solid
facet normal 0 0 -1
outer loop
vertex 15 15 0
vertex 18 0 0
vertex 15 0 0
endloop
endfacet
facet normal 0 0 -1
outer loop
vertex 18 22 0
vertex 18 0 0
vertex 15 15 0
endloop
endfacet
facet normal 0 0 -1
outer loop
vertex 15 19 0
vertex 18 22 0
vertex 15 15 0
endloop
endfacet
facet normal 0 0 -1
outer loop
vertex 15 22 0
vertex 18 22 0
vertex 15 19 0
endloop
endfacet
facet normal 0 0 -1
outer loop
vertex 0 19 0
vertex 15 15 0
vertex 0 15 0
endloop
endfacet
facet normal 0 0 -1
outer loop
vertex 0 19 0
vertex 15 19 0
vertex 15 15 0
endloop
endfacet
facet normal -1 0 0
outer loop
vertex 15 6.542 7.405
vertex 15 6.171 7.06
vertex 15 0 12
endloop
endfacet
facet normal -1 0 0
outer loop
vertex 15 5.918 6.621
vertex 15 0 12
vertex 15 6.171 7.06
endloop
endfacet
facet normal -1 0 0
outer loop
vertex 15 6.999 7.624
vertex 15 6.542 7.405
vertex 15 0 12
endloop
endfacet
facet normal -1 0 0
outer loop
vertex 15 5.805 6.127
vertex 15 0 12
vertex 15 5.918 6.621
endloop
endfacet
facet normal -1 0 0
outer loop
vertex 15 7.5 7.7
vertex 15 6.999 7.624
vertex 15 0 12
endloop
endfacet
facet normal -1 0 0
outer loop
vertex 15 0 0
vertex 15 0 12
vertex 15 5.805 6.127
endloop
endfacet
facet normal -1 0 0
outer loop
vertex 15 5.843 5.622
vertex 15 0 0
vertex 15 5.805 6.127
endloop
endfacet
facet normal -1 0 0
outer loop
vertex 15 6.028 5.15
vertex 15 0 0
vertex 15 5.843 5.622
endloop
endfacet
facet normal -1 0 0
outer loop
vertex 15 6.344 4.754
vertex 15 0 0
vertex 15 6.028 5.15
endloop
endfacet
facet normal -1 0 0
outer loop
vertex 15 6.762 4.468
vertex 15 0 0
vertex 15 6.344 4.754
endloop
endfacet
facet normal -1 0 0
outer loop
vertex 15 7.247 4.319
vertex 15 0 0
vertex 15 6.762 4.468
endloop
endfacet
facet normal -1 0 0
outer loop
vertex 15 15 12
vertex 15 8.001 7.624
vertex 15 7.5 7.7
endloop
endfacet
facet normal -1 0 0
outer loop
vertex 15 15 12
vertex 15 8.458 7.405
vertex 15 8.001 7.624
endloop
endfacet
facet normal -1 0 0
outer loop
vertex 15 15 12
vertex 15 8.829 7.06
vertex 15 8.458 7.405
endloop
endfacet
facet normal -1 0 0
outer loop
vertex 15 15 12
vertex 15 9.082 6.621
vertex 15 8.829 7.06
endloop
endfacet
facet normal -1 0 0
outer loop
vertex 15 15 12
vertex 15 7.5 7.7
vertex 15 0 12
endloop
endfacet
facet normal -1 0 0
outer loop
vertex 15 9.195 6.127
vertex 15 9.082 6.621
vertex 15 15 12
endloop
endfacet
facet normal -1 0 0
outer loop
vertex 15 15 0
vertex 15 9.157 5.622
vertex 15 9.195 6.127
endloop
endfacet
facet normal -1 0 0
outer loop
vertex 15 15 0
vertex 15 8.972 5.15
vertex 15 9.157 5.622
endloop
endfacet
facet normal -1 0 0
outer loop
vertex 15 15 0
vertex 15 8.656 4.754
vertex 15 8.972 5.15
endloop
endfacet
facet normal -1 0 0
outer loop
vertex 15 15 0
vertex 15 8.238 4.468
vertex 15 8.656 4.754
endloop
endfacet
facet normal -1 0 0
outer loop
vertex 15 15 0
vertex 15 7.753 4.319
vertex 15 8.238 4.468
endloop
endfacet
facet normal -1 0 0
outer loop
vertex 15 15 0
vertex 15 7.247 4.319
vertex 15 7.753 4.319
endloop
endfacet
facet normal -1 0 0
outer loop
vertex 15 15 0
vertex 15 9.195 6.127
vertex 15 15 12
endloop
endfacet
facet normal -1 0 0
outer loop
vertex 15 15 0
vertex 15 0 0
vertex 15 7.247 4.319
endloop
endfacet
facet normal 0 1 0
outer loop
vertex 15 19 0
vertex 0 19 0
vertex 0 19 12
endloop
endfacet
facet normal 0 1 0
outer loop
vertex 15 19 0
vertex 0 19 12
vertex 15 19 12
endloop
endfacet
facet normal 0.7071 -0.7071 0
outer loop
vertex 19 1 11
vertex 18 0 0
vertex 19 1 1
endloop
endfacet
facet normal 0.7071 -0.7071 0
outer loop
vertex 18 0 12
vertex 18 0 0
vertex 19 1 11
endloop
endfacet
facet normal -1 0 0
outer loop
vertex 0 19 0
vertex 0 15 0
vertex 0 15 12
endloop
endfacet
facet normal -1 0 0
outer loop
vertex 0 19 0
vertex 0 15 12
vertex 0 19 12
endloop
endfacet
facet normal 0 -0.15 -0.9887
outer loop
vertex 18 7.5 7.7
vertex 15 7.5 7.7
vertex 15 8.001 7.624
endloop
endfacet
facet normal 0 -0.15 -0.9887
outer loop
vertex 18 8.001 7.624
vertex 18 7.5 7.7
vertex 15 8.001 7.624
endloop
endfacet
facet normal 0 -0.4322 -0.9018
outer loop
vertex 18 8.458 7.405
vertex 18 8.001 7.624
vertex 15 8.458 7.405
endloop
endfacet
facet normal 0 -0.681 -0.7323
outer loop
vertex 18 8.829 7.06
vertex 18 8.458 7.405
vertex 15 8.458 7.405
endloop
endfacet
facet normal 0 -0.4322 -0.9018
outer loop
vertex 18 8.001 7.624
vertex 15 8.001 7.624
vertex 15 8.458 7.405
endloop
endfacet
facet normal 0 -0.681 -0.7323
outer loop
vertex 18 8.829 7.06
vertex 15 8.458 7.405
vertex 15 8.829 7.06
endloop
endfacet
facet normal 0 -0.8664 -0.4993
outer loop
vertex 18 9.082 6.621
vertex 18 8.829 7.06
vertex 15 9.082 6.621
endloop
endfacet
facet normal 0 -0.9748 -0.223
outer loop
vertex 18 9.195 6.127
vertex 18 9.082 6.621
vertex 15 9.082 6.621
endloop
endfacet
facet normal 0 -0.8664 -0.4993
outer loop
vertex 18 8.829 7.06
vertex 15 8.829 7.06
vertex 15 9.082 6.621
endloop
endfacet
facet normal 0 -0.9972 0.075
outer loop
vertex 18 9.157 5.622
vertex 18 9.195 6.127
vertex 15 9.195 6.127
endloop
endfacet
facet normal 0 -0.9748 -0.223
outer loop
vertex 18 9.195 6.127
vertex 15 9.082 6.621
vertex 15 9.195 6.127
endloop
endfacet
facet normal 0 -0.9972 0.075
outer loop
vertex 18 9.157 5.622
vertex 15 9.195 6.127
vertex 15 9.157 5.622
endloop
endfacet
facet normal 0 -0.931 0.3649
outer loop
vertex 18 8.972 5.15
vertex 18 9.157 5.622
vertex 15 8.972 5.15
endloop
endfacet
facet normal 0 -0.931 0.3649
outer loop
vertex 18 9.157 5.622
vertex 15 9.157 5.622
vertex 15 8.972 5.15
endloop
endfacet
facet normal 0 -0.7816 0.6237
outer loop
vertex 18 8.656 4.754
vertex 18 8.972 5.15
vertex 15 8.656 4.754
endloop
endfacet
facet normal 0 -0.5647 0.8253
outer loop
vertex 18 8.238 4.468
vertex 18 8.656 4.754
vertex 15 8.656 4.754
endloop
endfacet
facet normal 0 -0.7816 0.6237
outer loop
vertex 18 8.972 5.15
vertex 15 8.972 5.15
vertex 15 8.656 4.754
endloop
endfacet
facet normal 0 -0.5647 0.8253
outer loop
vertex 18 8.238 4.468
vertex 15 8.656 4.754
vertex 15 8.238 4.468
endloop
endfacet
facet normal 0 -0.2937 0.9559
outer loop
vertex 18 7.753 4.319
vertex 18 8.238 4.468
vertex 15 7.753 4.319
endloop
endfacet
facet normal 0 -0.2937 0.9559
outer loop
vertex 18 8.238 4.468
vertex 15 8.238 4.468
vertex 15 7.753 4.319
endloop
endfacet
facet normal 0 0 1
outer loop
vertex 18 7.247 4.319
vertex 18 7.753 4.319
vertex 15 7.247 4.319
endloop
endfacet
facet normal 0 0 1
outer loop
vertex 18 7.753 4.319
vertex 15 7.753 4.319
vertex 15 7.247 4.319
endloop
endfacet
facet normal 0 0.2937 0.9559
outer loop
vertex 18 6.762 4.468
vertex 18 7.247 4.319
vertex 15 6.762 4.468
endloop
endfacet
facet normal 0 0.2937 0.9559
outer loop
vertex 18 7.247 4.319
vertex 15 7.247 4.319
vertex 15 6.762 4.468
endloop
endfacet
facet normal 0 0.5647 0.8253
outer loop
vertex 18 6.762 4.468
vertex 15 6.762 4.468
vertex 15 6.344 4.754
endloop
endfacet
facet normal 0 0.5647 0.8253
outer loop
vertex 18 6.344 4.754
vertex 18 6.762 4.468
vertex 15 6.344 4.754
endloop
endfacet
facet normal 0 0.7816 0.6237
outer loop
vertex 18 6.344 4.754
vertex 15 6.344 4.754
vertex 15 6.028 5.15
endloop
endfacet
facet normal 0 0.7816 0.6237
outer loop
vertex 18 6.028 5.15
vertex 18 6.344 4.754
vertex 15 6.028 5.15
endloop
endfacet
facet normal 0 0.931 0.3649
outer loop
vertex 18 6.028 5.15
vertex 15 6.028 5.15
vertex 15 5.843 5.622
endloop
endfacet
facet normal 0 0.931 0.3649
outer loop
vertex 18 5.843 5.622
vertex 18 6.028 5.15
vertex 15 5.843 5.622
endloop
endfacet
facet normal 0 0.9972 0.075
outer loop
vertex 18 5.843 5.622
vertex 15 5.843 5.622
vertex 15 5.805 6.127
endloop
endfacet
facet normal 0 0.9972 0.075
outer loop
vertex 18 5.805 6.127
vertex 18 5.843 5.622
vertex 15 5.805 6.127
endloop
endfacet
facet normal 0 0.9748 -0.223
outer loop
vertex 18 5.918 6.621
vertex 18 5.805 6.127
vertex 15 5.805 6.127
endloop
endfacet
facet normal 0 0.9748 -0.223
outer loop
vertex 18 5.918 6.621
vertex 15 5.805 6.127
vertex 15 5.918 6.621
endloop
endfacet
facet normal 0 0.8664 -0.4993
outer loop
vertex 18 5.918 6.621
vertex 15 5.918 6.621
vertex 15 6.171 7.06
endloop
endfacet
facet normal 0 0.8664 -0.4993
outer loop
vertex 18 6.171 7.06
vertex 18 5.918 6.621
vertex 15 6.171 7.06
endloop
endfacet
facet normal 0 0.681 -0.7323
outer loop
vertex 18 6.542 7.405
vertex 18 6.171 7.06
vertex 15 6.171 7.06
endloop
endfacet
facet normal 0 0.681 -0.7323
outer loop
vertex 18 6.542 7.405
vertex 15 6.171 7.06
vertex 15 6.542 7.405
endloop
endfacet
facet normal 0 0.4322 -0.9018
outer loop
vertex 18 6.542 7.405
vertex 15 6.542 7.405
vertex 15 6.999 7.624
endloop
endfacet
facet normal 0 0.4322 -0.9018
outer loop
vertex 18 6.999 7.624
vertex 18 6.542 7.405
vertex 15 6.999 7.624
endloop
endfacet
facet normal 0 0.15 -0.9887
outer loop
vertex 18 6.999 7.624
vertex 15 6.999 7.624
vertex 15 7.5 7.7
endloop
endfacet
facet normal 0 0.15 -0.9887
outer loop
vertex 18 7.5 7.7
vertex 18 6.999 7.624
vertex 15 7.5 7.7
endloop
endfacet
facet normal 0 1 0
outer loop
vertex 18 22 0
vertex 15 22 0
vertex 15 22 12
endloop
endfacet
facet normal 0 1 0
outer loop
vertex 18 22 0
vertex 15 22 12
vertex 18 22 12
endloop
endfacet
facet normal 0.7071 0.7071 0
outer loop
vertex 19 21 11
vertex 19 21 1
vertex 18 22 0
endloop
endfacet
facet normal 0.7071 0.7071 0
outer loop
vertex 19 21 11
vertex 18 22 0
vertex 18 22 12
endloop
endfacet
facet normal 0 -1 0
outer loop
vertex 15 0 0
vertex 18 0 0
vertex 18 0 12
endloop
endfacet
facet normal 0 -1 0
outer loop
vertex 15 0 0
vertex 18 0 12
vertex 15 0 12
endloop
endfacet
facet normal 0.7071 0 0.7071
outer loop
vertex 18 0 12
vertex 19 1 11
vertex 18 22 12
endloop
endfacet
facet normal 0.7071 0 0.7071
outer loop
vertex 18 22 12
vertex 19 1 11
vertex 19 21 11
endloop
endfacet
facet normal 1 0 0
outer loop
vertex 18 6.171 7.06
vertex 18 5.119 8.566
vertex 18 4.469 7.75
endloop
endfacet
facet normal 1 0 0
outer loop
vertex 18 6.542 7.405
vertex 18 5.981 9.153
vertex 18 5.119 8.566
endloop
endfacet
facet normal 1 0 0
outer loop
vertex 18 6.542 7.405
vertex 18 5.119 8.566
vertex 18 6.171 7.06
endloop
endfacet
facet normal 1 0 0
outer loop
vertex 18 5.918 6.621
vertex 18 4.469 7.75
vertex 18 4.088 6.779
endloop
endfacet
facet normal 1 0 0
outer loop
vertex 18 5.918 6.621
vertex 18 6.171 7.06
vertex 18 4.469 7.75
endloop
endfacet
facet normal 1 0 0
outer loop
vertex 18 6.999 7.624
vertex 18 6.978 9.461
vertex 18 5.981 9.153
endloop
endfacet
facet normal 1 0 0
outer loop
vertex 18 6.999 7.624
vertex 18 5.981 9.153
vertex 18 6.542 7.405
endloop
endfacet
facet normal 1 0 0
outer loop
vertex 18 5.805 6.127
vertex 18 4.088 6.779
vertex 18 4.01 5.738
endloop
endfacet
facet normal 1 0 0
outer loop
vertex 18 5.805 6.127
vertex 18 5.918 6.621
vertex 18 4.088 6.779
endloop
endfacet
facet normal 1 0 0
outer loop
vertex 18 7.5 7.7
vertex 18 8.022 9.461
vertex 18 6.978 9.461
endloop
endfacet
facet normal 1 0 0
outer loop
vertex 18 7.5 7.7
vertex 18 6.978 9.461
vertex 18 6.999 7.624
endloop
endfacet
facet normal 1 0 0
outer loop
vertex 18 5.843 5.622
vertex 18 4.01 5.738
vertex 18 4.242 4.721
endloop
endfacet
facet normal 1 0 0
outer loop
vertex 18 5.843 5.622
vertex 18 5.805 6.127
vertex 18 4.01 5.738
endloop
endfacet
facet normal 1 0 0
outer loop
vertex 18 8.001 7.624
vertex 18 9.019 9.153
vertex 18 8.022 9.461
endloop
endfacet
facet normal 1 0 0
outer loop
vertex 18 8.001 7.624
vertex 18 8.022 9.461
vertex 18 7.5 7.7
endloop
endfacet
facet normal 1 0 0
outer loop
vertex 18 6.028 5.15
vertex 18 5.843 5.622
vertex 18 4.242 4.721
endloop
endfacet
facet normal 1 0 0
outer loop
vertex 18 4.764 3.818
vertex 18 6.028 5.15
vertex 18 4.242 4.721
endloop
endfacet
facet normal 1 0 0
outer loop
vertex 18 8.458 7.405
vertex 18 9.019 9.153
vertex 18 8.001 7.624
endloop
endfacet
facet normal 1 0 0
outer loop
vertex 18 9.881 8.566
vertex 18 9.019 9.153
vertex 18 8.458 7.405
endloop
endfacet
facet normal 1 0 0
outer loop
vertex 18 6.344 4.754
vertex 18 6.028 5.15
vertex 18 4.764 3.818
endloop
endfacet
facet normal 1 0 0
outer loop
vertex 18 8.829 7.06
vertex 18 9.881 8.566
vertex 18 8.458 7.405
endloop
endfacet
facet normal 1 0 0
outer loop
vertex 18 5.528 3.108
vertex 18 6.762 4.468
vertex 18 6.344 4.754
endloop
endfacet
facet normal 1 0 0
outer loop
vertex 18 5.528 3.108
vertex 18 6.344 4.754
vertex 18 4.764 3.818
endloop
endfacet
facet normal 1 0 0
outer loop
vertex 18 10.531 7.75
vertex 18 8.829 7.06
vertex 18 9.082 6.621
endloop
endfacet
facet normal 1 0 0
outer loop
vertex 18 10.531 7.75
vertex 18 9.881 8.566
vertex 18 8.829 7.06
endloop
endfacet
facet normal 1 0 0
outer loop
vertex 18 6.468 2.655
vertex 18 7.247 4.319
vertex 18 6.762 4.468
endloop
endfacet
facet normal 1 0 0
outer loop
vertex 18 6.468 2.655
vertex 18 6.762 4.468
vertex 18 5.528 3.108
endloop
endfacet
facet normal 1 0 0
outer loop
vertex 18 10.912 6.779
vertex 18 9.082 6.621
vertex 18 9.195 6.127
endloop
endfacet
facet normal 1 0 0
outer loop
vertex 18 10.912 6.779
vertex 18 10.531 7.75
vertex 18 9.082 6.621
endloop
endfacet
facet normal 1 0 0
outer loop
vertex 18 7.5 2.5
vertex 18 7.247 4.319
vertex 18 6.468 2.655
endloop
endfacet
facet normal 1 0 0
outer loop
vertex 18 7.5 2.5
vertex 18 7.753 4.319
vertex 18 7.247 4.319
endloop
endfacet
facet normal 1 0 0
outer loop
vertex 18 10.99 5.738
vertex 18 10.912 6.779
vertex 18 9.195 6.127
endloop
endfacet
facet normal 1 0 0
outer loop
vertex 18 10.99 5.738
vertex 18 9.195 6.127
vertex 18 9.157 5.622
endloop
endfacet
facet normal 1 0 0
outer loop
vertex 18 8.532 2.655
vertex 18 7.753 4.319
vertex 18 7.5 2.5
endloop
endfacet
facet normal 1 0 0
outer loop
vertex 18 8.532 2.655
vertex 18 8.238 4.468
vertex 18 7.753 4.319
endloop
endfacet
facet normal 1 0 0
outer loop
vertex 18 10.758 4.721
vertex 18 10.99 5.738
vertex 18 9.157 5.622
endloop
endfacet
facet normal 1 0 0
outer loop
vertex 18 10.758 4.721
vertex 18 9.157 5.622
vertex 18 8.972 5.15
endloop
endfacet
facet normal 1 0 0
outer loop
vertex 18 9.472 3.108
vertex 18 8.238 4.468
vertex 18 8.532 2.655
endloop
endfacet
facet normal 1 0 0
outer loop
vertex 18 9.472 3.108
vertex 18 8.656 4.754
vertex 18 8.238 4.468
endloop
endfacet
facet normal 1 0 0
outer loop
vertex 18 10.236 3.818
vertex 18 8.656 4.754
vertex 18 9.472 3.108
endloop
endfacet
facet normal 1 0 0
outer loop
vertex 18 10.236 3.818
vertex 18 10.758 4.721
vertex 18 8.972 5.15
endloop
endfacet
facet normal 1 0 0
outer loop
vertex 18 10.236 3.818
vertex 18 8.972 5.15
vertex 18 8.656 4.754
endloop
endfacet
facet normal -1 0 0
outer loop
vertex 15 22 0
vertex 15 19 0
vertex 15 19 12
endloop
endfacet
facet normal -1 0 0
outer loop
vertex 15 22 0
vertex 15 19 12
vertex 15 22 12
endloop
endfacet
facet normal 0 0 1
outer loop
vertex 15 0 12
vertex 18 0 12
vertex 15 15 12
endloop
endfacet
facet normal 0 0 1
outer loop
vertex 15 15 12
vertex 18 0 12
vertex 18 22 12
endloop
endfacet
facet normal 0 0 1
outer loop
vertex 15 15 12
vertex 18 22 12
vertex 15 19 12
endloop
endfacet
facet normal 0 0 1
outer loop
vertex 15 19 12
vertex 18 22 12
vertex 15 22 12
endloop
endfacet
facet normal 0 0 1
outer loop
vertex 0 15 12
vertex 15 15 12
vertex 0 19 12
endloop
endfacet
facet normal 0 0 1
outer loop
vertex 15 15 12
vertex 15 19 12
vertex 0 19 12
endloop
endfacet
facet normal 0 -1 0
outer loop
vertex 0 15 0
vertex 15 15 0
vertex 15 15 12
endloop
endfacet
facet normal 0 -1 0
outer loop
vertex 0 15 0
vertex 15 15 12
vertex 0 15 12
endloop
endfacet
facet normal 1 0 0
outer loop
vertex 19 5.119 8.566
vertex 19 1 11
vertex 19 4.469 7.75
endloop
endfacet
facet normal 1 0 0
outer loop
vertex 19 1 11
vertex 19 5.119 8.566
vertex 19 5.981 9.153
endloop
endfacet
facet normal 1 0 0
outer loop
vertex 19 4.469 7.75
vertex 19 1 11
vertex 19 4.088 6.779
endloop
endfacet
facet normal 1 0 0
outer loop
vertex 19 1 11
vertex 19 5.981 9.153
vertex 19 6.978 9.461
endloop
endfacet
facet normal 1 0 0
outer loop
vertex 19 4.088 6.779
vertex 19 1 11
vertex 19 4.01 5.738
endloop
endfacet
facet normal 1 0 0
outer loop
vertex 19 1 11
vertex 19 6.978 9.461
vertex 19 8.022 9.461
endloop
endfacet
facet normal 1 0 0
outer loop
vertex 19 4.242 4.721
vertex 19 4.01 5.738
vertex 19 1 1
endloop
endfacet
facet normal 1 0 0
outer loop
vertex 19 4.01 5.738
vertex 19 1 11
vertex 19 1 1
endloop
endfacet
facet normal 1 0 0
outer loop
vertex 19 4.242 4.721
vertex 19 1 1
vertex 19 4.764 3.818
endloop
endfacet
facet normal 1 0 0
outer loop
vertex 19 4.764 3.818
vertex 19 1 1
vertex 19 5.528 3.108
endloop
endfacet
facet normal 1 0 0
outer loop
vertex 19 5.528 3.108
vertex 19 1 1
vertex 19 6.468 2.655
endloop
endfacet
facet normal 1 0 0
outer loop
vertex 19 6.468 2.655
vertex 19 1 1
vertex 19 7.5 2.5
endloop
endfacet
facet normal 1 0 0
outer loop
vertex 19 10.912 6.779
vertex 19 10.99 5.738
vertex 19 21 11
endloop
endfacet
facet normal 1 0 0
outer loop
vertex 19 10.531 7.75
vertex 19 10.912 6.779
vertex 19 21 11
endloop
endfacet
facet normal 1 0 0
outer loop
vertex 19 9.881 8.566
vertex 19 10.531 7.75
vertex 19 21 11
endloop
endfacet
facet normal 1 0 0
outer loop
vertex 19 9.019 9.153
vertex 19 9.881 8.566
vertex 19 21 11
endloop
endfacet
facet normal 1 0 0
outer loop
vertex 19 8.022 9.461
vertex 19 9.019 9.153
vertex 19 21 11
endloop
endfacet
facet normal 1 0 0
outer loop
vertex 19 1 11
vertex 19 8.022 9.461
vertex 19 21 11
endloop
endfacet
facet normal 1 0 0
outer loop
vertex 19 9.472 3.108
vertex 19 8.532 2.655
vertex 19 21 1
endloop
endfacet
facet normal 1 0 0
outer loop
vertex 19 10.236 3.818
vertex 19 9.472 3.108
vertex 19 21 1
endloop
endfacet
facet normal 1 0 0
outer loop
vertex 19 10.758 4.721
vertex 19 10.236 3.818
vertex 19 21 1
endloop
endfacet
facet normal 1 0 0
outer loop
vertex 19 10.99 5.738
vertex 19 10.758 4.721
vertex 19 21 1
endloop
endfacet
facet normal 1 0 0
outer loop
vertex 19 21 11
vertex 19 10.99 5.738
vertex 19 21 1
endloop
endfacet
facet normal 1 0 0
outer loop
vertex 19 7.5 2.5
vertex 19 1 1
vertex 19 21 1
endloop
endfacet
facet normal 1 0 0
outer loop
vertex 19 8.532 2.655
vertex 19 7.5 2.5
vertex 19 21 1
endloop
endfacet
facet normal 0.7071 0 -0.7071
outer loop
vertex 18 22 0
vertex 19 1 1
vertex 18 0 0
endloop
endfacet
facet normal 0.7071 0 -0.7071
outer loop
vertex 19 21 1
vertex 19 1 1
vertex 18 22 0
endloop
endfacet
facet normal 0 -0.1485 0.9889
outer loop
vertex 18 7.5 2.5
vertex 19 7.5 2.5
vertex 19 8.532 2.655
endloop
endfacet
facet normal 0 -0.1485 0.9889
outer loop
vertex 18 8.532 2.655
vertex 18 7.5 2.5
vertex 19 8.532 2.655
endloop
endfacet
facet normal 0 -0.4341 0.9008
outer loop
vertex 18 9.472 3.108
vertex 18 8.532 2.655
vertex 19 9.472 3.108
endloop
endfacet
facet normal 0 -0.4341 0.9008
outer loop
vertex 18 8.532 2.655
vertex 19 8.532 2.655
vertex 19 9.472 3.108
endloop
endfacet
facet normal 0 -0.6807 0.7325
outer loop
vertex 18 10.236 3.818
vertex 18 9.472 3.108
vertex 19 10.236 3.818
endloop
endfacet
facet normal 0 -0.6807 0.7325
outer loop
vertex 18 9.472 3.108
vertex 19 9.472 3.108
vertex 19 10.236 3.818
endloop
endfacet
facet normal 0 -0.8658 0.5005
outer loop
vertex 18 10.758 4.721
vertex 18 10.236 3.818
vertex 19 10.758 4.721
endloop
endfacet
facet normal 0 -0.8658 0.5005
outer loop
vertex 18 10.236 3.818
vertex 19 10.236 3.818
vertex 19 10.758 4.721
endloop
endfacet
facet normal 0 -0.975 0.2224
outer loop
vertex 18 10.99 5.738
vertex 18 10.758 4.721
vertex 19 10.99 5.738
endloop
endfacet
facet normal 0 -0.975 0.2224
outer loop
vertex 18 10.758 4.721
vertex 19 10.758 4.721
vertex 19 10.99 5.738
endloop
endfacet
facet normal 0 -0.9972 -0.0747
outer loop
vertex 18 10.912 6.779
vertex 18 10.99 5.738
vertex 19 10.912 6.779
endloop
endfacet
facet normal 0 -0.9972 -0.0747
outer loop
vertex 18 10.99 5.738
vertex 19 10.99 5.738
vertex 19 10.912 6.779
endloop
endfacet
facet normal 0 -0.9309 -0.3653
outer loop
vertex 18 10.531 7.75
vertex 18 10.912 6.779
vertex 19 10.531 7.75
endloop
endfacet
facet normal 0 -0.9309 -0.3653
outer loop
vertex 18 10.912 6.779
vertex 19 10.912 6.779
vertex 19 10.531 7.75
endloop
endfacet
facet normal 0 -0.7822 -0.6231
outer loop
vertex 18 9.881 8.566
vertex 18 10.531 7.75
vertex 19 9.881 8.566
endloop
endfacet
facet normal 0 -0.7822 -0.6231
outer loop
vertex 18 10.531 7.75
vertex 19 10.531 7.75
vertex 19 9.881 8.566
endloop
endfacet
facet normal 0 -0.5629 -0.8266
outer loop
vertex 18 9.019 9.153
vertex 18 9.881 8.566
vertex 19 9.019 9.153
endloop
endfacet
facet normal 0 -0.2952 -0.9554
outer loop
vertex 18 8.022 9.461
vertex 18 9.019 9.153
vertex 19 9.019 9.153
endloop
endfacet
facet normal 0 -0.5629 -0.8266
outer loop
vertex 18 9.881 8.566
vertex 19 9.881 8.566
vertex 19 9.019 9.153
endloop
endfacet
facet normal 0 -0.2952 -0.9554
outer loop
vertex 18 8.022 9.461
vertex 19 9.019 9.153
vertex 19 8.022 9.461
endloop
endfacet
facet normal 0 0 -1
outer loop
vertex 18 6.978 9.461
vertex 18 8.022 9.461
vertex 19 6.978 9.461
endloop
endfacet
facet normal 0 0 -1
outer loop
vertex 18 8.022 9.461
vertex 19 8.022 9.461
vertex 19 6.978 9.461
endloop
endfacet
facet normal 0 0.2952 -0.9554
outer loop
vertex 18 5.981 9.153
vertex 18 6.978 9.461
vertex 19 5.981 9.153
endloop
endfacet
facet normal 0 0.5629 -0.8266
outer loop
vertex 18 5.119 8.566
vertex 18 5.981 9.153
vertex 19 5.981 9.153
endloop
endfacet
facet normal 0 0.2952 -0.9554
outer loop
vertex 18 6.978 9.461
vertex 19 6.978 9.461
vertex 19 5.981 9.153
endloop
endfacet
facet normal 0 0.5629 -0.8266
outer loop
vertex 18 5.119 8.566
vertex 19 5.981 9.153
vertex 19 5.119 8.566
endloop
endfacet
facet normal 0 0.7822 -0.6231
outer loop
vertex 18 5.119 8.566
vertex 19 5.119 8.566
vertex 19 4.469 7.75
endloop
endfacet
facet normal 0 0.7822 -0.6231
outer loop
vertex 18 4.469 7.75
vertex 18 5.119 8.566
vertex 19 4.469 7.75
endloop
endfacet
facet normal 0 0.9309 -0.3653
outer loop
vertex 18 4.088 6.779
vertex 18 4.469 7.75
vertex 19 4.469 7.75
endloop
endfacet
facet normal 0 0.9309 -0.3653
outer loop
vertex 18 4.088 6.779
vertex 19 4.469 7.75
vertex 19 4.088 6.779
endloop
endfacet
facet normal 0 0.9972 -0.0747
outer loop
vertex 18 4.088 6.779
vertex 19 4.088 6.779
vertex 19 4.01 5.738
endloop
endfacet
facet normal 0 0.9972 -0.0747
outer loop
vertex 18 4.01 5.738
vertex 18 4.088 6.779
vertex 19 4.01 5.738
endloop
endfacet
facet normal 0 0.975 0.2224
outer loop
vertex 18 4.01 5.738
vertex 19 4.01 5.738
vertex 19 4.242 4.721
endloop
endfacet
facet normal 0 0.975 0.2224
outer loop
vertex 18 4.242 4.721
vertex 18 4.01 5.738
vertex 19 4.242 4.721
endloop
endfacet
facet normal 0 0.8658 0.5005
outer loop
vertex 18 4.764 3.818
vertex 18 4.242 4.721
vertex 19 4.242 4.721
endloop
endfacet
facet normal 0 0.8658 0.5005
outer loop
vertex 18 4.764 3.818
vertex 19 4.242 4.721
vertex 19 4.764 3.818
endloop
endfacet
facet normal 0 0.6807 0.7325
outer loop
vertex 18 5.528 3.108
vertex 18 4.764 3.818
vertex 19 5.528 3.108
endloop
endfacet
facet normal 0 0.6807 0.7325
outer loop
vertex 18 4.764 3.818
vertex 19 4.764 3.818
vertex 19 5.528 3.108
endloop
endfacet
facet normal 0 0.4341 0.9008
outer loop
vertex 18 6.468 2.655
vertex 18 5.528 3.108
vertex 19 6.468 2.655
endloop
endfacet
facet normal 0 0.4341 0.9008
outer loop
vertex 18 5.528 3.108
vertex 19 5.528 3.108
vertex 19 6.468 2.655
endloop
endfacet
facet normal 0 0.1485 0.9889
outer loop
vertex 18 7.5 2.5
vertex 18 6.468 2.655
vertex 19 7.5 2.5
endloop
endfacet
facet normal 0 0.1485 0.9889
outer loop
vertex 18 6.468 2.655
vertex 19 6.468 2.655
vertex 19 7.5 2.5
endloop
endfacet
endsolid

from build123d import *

# Parameters (mm, degrees)
BOSS_EXTRUDE1_DEPTH = 12
SKETCH2_R           = 1.7
CUT_EXTRUDE1_DEPTH  = 12
SKETCH3_R           = 3.5
CUT_EXTRUDE2_DEPTH  = 1
CHAMFER1_SIZE       = 1


with BuildPart() as part:
    # Sketch1 → Boss-Extrude1 (new body)
    with BuildSketch(Plane.XY):
        Polygon((0, 19), (15, 19), (15, 22), (19, 22), (19, 19), (19, 0), (15, 0), (15, 15), (0, 15), align=None)
    extrude(amount=BOSS_EXTRUDE1_DEPTH)

    # Sketch2 → Cut-Extrude1 (cut)
    with BuildSketch(Plane.ZY.offset(-15)):
        with Locations((6, 7.5)):
            Circle(SKETCH2_R)
    extrude(amount=-CUT_EXTRUDE1_DEPTH, mode=Mode.SUBTRACT)

    # Sketch3 → Cut-Extrude2 (cut)
    with BuildSketch(Plane(origin=(19, 0, 0), x_dir=(0, 0, -1), z_dir=(1, 0, 0))):
        with Locations((-6, 7.5)):
            Circle(SKETCH3_R)
    extrude(amount=-CUT_EXTRUDE2_DEPTH, mode=Mode.SUBTRACT)

    # Chamfer1
    chamfer1_edges = [part.edges().sort_by_distance(p)[0] for p in [
        (19, 11, 12),
        (19, 11, 0),
        (19, 22, 6),
        (19, 0, 6),
    ]]
    chamfer(chamfer1_edges, length=CHAMFER1_SIZE)


solid = part.part
